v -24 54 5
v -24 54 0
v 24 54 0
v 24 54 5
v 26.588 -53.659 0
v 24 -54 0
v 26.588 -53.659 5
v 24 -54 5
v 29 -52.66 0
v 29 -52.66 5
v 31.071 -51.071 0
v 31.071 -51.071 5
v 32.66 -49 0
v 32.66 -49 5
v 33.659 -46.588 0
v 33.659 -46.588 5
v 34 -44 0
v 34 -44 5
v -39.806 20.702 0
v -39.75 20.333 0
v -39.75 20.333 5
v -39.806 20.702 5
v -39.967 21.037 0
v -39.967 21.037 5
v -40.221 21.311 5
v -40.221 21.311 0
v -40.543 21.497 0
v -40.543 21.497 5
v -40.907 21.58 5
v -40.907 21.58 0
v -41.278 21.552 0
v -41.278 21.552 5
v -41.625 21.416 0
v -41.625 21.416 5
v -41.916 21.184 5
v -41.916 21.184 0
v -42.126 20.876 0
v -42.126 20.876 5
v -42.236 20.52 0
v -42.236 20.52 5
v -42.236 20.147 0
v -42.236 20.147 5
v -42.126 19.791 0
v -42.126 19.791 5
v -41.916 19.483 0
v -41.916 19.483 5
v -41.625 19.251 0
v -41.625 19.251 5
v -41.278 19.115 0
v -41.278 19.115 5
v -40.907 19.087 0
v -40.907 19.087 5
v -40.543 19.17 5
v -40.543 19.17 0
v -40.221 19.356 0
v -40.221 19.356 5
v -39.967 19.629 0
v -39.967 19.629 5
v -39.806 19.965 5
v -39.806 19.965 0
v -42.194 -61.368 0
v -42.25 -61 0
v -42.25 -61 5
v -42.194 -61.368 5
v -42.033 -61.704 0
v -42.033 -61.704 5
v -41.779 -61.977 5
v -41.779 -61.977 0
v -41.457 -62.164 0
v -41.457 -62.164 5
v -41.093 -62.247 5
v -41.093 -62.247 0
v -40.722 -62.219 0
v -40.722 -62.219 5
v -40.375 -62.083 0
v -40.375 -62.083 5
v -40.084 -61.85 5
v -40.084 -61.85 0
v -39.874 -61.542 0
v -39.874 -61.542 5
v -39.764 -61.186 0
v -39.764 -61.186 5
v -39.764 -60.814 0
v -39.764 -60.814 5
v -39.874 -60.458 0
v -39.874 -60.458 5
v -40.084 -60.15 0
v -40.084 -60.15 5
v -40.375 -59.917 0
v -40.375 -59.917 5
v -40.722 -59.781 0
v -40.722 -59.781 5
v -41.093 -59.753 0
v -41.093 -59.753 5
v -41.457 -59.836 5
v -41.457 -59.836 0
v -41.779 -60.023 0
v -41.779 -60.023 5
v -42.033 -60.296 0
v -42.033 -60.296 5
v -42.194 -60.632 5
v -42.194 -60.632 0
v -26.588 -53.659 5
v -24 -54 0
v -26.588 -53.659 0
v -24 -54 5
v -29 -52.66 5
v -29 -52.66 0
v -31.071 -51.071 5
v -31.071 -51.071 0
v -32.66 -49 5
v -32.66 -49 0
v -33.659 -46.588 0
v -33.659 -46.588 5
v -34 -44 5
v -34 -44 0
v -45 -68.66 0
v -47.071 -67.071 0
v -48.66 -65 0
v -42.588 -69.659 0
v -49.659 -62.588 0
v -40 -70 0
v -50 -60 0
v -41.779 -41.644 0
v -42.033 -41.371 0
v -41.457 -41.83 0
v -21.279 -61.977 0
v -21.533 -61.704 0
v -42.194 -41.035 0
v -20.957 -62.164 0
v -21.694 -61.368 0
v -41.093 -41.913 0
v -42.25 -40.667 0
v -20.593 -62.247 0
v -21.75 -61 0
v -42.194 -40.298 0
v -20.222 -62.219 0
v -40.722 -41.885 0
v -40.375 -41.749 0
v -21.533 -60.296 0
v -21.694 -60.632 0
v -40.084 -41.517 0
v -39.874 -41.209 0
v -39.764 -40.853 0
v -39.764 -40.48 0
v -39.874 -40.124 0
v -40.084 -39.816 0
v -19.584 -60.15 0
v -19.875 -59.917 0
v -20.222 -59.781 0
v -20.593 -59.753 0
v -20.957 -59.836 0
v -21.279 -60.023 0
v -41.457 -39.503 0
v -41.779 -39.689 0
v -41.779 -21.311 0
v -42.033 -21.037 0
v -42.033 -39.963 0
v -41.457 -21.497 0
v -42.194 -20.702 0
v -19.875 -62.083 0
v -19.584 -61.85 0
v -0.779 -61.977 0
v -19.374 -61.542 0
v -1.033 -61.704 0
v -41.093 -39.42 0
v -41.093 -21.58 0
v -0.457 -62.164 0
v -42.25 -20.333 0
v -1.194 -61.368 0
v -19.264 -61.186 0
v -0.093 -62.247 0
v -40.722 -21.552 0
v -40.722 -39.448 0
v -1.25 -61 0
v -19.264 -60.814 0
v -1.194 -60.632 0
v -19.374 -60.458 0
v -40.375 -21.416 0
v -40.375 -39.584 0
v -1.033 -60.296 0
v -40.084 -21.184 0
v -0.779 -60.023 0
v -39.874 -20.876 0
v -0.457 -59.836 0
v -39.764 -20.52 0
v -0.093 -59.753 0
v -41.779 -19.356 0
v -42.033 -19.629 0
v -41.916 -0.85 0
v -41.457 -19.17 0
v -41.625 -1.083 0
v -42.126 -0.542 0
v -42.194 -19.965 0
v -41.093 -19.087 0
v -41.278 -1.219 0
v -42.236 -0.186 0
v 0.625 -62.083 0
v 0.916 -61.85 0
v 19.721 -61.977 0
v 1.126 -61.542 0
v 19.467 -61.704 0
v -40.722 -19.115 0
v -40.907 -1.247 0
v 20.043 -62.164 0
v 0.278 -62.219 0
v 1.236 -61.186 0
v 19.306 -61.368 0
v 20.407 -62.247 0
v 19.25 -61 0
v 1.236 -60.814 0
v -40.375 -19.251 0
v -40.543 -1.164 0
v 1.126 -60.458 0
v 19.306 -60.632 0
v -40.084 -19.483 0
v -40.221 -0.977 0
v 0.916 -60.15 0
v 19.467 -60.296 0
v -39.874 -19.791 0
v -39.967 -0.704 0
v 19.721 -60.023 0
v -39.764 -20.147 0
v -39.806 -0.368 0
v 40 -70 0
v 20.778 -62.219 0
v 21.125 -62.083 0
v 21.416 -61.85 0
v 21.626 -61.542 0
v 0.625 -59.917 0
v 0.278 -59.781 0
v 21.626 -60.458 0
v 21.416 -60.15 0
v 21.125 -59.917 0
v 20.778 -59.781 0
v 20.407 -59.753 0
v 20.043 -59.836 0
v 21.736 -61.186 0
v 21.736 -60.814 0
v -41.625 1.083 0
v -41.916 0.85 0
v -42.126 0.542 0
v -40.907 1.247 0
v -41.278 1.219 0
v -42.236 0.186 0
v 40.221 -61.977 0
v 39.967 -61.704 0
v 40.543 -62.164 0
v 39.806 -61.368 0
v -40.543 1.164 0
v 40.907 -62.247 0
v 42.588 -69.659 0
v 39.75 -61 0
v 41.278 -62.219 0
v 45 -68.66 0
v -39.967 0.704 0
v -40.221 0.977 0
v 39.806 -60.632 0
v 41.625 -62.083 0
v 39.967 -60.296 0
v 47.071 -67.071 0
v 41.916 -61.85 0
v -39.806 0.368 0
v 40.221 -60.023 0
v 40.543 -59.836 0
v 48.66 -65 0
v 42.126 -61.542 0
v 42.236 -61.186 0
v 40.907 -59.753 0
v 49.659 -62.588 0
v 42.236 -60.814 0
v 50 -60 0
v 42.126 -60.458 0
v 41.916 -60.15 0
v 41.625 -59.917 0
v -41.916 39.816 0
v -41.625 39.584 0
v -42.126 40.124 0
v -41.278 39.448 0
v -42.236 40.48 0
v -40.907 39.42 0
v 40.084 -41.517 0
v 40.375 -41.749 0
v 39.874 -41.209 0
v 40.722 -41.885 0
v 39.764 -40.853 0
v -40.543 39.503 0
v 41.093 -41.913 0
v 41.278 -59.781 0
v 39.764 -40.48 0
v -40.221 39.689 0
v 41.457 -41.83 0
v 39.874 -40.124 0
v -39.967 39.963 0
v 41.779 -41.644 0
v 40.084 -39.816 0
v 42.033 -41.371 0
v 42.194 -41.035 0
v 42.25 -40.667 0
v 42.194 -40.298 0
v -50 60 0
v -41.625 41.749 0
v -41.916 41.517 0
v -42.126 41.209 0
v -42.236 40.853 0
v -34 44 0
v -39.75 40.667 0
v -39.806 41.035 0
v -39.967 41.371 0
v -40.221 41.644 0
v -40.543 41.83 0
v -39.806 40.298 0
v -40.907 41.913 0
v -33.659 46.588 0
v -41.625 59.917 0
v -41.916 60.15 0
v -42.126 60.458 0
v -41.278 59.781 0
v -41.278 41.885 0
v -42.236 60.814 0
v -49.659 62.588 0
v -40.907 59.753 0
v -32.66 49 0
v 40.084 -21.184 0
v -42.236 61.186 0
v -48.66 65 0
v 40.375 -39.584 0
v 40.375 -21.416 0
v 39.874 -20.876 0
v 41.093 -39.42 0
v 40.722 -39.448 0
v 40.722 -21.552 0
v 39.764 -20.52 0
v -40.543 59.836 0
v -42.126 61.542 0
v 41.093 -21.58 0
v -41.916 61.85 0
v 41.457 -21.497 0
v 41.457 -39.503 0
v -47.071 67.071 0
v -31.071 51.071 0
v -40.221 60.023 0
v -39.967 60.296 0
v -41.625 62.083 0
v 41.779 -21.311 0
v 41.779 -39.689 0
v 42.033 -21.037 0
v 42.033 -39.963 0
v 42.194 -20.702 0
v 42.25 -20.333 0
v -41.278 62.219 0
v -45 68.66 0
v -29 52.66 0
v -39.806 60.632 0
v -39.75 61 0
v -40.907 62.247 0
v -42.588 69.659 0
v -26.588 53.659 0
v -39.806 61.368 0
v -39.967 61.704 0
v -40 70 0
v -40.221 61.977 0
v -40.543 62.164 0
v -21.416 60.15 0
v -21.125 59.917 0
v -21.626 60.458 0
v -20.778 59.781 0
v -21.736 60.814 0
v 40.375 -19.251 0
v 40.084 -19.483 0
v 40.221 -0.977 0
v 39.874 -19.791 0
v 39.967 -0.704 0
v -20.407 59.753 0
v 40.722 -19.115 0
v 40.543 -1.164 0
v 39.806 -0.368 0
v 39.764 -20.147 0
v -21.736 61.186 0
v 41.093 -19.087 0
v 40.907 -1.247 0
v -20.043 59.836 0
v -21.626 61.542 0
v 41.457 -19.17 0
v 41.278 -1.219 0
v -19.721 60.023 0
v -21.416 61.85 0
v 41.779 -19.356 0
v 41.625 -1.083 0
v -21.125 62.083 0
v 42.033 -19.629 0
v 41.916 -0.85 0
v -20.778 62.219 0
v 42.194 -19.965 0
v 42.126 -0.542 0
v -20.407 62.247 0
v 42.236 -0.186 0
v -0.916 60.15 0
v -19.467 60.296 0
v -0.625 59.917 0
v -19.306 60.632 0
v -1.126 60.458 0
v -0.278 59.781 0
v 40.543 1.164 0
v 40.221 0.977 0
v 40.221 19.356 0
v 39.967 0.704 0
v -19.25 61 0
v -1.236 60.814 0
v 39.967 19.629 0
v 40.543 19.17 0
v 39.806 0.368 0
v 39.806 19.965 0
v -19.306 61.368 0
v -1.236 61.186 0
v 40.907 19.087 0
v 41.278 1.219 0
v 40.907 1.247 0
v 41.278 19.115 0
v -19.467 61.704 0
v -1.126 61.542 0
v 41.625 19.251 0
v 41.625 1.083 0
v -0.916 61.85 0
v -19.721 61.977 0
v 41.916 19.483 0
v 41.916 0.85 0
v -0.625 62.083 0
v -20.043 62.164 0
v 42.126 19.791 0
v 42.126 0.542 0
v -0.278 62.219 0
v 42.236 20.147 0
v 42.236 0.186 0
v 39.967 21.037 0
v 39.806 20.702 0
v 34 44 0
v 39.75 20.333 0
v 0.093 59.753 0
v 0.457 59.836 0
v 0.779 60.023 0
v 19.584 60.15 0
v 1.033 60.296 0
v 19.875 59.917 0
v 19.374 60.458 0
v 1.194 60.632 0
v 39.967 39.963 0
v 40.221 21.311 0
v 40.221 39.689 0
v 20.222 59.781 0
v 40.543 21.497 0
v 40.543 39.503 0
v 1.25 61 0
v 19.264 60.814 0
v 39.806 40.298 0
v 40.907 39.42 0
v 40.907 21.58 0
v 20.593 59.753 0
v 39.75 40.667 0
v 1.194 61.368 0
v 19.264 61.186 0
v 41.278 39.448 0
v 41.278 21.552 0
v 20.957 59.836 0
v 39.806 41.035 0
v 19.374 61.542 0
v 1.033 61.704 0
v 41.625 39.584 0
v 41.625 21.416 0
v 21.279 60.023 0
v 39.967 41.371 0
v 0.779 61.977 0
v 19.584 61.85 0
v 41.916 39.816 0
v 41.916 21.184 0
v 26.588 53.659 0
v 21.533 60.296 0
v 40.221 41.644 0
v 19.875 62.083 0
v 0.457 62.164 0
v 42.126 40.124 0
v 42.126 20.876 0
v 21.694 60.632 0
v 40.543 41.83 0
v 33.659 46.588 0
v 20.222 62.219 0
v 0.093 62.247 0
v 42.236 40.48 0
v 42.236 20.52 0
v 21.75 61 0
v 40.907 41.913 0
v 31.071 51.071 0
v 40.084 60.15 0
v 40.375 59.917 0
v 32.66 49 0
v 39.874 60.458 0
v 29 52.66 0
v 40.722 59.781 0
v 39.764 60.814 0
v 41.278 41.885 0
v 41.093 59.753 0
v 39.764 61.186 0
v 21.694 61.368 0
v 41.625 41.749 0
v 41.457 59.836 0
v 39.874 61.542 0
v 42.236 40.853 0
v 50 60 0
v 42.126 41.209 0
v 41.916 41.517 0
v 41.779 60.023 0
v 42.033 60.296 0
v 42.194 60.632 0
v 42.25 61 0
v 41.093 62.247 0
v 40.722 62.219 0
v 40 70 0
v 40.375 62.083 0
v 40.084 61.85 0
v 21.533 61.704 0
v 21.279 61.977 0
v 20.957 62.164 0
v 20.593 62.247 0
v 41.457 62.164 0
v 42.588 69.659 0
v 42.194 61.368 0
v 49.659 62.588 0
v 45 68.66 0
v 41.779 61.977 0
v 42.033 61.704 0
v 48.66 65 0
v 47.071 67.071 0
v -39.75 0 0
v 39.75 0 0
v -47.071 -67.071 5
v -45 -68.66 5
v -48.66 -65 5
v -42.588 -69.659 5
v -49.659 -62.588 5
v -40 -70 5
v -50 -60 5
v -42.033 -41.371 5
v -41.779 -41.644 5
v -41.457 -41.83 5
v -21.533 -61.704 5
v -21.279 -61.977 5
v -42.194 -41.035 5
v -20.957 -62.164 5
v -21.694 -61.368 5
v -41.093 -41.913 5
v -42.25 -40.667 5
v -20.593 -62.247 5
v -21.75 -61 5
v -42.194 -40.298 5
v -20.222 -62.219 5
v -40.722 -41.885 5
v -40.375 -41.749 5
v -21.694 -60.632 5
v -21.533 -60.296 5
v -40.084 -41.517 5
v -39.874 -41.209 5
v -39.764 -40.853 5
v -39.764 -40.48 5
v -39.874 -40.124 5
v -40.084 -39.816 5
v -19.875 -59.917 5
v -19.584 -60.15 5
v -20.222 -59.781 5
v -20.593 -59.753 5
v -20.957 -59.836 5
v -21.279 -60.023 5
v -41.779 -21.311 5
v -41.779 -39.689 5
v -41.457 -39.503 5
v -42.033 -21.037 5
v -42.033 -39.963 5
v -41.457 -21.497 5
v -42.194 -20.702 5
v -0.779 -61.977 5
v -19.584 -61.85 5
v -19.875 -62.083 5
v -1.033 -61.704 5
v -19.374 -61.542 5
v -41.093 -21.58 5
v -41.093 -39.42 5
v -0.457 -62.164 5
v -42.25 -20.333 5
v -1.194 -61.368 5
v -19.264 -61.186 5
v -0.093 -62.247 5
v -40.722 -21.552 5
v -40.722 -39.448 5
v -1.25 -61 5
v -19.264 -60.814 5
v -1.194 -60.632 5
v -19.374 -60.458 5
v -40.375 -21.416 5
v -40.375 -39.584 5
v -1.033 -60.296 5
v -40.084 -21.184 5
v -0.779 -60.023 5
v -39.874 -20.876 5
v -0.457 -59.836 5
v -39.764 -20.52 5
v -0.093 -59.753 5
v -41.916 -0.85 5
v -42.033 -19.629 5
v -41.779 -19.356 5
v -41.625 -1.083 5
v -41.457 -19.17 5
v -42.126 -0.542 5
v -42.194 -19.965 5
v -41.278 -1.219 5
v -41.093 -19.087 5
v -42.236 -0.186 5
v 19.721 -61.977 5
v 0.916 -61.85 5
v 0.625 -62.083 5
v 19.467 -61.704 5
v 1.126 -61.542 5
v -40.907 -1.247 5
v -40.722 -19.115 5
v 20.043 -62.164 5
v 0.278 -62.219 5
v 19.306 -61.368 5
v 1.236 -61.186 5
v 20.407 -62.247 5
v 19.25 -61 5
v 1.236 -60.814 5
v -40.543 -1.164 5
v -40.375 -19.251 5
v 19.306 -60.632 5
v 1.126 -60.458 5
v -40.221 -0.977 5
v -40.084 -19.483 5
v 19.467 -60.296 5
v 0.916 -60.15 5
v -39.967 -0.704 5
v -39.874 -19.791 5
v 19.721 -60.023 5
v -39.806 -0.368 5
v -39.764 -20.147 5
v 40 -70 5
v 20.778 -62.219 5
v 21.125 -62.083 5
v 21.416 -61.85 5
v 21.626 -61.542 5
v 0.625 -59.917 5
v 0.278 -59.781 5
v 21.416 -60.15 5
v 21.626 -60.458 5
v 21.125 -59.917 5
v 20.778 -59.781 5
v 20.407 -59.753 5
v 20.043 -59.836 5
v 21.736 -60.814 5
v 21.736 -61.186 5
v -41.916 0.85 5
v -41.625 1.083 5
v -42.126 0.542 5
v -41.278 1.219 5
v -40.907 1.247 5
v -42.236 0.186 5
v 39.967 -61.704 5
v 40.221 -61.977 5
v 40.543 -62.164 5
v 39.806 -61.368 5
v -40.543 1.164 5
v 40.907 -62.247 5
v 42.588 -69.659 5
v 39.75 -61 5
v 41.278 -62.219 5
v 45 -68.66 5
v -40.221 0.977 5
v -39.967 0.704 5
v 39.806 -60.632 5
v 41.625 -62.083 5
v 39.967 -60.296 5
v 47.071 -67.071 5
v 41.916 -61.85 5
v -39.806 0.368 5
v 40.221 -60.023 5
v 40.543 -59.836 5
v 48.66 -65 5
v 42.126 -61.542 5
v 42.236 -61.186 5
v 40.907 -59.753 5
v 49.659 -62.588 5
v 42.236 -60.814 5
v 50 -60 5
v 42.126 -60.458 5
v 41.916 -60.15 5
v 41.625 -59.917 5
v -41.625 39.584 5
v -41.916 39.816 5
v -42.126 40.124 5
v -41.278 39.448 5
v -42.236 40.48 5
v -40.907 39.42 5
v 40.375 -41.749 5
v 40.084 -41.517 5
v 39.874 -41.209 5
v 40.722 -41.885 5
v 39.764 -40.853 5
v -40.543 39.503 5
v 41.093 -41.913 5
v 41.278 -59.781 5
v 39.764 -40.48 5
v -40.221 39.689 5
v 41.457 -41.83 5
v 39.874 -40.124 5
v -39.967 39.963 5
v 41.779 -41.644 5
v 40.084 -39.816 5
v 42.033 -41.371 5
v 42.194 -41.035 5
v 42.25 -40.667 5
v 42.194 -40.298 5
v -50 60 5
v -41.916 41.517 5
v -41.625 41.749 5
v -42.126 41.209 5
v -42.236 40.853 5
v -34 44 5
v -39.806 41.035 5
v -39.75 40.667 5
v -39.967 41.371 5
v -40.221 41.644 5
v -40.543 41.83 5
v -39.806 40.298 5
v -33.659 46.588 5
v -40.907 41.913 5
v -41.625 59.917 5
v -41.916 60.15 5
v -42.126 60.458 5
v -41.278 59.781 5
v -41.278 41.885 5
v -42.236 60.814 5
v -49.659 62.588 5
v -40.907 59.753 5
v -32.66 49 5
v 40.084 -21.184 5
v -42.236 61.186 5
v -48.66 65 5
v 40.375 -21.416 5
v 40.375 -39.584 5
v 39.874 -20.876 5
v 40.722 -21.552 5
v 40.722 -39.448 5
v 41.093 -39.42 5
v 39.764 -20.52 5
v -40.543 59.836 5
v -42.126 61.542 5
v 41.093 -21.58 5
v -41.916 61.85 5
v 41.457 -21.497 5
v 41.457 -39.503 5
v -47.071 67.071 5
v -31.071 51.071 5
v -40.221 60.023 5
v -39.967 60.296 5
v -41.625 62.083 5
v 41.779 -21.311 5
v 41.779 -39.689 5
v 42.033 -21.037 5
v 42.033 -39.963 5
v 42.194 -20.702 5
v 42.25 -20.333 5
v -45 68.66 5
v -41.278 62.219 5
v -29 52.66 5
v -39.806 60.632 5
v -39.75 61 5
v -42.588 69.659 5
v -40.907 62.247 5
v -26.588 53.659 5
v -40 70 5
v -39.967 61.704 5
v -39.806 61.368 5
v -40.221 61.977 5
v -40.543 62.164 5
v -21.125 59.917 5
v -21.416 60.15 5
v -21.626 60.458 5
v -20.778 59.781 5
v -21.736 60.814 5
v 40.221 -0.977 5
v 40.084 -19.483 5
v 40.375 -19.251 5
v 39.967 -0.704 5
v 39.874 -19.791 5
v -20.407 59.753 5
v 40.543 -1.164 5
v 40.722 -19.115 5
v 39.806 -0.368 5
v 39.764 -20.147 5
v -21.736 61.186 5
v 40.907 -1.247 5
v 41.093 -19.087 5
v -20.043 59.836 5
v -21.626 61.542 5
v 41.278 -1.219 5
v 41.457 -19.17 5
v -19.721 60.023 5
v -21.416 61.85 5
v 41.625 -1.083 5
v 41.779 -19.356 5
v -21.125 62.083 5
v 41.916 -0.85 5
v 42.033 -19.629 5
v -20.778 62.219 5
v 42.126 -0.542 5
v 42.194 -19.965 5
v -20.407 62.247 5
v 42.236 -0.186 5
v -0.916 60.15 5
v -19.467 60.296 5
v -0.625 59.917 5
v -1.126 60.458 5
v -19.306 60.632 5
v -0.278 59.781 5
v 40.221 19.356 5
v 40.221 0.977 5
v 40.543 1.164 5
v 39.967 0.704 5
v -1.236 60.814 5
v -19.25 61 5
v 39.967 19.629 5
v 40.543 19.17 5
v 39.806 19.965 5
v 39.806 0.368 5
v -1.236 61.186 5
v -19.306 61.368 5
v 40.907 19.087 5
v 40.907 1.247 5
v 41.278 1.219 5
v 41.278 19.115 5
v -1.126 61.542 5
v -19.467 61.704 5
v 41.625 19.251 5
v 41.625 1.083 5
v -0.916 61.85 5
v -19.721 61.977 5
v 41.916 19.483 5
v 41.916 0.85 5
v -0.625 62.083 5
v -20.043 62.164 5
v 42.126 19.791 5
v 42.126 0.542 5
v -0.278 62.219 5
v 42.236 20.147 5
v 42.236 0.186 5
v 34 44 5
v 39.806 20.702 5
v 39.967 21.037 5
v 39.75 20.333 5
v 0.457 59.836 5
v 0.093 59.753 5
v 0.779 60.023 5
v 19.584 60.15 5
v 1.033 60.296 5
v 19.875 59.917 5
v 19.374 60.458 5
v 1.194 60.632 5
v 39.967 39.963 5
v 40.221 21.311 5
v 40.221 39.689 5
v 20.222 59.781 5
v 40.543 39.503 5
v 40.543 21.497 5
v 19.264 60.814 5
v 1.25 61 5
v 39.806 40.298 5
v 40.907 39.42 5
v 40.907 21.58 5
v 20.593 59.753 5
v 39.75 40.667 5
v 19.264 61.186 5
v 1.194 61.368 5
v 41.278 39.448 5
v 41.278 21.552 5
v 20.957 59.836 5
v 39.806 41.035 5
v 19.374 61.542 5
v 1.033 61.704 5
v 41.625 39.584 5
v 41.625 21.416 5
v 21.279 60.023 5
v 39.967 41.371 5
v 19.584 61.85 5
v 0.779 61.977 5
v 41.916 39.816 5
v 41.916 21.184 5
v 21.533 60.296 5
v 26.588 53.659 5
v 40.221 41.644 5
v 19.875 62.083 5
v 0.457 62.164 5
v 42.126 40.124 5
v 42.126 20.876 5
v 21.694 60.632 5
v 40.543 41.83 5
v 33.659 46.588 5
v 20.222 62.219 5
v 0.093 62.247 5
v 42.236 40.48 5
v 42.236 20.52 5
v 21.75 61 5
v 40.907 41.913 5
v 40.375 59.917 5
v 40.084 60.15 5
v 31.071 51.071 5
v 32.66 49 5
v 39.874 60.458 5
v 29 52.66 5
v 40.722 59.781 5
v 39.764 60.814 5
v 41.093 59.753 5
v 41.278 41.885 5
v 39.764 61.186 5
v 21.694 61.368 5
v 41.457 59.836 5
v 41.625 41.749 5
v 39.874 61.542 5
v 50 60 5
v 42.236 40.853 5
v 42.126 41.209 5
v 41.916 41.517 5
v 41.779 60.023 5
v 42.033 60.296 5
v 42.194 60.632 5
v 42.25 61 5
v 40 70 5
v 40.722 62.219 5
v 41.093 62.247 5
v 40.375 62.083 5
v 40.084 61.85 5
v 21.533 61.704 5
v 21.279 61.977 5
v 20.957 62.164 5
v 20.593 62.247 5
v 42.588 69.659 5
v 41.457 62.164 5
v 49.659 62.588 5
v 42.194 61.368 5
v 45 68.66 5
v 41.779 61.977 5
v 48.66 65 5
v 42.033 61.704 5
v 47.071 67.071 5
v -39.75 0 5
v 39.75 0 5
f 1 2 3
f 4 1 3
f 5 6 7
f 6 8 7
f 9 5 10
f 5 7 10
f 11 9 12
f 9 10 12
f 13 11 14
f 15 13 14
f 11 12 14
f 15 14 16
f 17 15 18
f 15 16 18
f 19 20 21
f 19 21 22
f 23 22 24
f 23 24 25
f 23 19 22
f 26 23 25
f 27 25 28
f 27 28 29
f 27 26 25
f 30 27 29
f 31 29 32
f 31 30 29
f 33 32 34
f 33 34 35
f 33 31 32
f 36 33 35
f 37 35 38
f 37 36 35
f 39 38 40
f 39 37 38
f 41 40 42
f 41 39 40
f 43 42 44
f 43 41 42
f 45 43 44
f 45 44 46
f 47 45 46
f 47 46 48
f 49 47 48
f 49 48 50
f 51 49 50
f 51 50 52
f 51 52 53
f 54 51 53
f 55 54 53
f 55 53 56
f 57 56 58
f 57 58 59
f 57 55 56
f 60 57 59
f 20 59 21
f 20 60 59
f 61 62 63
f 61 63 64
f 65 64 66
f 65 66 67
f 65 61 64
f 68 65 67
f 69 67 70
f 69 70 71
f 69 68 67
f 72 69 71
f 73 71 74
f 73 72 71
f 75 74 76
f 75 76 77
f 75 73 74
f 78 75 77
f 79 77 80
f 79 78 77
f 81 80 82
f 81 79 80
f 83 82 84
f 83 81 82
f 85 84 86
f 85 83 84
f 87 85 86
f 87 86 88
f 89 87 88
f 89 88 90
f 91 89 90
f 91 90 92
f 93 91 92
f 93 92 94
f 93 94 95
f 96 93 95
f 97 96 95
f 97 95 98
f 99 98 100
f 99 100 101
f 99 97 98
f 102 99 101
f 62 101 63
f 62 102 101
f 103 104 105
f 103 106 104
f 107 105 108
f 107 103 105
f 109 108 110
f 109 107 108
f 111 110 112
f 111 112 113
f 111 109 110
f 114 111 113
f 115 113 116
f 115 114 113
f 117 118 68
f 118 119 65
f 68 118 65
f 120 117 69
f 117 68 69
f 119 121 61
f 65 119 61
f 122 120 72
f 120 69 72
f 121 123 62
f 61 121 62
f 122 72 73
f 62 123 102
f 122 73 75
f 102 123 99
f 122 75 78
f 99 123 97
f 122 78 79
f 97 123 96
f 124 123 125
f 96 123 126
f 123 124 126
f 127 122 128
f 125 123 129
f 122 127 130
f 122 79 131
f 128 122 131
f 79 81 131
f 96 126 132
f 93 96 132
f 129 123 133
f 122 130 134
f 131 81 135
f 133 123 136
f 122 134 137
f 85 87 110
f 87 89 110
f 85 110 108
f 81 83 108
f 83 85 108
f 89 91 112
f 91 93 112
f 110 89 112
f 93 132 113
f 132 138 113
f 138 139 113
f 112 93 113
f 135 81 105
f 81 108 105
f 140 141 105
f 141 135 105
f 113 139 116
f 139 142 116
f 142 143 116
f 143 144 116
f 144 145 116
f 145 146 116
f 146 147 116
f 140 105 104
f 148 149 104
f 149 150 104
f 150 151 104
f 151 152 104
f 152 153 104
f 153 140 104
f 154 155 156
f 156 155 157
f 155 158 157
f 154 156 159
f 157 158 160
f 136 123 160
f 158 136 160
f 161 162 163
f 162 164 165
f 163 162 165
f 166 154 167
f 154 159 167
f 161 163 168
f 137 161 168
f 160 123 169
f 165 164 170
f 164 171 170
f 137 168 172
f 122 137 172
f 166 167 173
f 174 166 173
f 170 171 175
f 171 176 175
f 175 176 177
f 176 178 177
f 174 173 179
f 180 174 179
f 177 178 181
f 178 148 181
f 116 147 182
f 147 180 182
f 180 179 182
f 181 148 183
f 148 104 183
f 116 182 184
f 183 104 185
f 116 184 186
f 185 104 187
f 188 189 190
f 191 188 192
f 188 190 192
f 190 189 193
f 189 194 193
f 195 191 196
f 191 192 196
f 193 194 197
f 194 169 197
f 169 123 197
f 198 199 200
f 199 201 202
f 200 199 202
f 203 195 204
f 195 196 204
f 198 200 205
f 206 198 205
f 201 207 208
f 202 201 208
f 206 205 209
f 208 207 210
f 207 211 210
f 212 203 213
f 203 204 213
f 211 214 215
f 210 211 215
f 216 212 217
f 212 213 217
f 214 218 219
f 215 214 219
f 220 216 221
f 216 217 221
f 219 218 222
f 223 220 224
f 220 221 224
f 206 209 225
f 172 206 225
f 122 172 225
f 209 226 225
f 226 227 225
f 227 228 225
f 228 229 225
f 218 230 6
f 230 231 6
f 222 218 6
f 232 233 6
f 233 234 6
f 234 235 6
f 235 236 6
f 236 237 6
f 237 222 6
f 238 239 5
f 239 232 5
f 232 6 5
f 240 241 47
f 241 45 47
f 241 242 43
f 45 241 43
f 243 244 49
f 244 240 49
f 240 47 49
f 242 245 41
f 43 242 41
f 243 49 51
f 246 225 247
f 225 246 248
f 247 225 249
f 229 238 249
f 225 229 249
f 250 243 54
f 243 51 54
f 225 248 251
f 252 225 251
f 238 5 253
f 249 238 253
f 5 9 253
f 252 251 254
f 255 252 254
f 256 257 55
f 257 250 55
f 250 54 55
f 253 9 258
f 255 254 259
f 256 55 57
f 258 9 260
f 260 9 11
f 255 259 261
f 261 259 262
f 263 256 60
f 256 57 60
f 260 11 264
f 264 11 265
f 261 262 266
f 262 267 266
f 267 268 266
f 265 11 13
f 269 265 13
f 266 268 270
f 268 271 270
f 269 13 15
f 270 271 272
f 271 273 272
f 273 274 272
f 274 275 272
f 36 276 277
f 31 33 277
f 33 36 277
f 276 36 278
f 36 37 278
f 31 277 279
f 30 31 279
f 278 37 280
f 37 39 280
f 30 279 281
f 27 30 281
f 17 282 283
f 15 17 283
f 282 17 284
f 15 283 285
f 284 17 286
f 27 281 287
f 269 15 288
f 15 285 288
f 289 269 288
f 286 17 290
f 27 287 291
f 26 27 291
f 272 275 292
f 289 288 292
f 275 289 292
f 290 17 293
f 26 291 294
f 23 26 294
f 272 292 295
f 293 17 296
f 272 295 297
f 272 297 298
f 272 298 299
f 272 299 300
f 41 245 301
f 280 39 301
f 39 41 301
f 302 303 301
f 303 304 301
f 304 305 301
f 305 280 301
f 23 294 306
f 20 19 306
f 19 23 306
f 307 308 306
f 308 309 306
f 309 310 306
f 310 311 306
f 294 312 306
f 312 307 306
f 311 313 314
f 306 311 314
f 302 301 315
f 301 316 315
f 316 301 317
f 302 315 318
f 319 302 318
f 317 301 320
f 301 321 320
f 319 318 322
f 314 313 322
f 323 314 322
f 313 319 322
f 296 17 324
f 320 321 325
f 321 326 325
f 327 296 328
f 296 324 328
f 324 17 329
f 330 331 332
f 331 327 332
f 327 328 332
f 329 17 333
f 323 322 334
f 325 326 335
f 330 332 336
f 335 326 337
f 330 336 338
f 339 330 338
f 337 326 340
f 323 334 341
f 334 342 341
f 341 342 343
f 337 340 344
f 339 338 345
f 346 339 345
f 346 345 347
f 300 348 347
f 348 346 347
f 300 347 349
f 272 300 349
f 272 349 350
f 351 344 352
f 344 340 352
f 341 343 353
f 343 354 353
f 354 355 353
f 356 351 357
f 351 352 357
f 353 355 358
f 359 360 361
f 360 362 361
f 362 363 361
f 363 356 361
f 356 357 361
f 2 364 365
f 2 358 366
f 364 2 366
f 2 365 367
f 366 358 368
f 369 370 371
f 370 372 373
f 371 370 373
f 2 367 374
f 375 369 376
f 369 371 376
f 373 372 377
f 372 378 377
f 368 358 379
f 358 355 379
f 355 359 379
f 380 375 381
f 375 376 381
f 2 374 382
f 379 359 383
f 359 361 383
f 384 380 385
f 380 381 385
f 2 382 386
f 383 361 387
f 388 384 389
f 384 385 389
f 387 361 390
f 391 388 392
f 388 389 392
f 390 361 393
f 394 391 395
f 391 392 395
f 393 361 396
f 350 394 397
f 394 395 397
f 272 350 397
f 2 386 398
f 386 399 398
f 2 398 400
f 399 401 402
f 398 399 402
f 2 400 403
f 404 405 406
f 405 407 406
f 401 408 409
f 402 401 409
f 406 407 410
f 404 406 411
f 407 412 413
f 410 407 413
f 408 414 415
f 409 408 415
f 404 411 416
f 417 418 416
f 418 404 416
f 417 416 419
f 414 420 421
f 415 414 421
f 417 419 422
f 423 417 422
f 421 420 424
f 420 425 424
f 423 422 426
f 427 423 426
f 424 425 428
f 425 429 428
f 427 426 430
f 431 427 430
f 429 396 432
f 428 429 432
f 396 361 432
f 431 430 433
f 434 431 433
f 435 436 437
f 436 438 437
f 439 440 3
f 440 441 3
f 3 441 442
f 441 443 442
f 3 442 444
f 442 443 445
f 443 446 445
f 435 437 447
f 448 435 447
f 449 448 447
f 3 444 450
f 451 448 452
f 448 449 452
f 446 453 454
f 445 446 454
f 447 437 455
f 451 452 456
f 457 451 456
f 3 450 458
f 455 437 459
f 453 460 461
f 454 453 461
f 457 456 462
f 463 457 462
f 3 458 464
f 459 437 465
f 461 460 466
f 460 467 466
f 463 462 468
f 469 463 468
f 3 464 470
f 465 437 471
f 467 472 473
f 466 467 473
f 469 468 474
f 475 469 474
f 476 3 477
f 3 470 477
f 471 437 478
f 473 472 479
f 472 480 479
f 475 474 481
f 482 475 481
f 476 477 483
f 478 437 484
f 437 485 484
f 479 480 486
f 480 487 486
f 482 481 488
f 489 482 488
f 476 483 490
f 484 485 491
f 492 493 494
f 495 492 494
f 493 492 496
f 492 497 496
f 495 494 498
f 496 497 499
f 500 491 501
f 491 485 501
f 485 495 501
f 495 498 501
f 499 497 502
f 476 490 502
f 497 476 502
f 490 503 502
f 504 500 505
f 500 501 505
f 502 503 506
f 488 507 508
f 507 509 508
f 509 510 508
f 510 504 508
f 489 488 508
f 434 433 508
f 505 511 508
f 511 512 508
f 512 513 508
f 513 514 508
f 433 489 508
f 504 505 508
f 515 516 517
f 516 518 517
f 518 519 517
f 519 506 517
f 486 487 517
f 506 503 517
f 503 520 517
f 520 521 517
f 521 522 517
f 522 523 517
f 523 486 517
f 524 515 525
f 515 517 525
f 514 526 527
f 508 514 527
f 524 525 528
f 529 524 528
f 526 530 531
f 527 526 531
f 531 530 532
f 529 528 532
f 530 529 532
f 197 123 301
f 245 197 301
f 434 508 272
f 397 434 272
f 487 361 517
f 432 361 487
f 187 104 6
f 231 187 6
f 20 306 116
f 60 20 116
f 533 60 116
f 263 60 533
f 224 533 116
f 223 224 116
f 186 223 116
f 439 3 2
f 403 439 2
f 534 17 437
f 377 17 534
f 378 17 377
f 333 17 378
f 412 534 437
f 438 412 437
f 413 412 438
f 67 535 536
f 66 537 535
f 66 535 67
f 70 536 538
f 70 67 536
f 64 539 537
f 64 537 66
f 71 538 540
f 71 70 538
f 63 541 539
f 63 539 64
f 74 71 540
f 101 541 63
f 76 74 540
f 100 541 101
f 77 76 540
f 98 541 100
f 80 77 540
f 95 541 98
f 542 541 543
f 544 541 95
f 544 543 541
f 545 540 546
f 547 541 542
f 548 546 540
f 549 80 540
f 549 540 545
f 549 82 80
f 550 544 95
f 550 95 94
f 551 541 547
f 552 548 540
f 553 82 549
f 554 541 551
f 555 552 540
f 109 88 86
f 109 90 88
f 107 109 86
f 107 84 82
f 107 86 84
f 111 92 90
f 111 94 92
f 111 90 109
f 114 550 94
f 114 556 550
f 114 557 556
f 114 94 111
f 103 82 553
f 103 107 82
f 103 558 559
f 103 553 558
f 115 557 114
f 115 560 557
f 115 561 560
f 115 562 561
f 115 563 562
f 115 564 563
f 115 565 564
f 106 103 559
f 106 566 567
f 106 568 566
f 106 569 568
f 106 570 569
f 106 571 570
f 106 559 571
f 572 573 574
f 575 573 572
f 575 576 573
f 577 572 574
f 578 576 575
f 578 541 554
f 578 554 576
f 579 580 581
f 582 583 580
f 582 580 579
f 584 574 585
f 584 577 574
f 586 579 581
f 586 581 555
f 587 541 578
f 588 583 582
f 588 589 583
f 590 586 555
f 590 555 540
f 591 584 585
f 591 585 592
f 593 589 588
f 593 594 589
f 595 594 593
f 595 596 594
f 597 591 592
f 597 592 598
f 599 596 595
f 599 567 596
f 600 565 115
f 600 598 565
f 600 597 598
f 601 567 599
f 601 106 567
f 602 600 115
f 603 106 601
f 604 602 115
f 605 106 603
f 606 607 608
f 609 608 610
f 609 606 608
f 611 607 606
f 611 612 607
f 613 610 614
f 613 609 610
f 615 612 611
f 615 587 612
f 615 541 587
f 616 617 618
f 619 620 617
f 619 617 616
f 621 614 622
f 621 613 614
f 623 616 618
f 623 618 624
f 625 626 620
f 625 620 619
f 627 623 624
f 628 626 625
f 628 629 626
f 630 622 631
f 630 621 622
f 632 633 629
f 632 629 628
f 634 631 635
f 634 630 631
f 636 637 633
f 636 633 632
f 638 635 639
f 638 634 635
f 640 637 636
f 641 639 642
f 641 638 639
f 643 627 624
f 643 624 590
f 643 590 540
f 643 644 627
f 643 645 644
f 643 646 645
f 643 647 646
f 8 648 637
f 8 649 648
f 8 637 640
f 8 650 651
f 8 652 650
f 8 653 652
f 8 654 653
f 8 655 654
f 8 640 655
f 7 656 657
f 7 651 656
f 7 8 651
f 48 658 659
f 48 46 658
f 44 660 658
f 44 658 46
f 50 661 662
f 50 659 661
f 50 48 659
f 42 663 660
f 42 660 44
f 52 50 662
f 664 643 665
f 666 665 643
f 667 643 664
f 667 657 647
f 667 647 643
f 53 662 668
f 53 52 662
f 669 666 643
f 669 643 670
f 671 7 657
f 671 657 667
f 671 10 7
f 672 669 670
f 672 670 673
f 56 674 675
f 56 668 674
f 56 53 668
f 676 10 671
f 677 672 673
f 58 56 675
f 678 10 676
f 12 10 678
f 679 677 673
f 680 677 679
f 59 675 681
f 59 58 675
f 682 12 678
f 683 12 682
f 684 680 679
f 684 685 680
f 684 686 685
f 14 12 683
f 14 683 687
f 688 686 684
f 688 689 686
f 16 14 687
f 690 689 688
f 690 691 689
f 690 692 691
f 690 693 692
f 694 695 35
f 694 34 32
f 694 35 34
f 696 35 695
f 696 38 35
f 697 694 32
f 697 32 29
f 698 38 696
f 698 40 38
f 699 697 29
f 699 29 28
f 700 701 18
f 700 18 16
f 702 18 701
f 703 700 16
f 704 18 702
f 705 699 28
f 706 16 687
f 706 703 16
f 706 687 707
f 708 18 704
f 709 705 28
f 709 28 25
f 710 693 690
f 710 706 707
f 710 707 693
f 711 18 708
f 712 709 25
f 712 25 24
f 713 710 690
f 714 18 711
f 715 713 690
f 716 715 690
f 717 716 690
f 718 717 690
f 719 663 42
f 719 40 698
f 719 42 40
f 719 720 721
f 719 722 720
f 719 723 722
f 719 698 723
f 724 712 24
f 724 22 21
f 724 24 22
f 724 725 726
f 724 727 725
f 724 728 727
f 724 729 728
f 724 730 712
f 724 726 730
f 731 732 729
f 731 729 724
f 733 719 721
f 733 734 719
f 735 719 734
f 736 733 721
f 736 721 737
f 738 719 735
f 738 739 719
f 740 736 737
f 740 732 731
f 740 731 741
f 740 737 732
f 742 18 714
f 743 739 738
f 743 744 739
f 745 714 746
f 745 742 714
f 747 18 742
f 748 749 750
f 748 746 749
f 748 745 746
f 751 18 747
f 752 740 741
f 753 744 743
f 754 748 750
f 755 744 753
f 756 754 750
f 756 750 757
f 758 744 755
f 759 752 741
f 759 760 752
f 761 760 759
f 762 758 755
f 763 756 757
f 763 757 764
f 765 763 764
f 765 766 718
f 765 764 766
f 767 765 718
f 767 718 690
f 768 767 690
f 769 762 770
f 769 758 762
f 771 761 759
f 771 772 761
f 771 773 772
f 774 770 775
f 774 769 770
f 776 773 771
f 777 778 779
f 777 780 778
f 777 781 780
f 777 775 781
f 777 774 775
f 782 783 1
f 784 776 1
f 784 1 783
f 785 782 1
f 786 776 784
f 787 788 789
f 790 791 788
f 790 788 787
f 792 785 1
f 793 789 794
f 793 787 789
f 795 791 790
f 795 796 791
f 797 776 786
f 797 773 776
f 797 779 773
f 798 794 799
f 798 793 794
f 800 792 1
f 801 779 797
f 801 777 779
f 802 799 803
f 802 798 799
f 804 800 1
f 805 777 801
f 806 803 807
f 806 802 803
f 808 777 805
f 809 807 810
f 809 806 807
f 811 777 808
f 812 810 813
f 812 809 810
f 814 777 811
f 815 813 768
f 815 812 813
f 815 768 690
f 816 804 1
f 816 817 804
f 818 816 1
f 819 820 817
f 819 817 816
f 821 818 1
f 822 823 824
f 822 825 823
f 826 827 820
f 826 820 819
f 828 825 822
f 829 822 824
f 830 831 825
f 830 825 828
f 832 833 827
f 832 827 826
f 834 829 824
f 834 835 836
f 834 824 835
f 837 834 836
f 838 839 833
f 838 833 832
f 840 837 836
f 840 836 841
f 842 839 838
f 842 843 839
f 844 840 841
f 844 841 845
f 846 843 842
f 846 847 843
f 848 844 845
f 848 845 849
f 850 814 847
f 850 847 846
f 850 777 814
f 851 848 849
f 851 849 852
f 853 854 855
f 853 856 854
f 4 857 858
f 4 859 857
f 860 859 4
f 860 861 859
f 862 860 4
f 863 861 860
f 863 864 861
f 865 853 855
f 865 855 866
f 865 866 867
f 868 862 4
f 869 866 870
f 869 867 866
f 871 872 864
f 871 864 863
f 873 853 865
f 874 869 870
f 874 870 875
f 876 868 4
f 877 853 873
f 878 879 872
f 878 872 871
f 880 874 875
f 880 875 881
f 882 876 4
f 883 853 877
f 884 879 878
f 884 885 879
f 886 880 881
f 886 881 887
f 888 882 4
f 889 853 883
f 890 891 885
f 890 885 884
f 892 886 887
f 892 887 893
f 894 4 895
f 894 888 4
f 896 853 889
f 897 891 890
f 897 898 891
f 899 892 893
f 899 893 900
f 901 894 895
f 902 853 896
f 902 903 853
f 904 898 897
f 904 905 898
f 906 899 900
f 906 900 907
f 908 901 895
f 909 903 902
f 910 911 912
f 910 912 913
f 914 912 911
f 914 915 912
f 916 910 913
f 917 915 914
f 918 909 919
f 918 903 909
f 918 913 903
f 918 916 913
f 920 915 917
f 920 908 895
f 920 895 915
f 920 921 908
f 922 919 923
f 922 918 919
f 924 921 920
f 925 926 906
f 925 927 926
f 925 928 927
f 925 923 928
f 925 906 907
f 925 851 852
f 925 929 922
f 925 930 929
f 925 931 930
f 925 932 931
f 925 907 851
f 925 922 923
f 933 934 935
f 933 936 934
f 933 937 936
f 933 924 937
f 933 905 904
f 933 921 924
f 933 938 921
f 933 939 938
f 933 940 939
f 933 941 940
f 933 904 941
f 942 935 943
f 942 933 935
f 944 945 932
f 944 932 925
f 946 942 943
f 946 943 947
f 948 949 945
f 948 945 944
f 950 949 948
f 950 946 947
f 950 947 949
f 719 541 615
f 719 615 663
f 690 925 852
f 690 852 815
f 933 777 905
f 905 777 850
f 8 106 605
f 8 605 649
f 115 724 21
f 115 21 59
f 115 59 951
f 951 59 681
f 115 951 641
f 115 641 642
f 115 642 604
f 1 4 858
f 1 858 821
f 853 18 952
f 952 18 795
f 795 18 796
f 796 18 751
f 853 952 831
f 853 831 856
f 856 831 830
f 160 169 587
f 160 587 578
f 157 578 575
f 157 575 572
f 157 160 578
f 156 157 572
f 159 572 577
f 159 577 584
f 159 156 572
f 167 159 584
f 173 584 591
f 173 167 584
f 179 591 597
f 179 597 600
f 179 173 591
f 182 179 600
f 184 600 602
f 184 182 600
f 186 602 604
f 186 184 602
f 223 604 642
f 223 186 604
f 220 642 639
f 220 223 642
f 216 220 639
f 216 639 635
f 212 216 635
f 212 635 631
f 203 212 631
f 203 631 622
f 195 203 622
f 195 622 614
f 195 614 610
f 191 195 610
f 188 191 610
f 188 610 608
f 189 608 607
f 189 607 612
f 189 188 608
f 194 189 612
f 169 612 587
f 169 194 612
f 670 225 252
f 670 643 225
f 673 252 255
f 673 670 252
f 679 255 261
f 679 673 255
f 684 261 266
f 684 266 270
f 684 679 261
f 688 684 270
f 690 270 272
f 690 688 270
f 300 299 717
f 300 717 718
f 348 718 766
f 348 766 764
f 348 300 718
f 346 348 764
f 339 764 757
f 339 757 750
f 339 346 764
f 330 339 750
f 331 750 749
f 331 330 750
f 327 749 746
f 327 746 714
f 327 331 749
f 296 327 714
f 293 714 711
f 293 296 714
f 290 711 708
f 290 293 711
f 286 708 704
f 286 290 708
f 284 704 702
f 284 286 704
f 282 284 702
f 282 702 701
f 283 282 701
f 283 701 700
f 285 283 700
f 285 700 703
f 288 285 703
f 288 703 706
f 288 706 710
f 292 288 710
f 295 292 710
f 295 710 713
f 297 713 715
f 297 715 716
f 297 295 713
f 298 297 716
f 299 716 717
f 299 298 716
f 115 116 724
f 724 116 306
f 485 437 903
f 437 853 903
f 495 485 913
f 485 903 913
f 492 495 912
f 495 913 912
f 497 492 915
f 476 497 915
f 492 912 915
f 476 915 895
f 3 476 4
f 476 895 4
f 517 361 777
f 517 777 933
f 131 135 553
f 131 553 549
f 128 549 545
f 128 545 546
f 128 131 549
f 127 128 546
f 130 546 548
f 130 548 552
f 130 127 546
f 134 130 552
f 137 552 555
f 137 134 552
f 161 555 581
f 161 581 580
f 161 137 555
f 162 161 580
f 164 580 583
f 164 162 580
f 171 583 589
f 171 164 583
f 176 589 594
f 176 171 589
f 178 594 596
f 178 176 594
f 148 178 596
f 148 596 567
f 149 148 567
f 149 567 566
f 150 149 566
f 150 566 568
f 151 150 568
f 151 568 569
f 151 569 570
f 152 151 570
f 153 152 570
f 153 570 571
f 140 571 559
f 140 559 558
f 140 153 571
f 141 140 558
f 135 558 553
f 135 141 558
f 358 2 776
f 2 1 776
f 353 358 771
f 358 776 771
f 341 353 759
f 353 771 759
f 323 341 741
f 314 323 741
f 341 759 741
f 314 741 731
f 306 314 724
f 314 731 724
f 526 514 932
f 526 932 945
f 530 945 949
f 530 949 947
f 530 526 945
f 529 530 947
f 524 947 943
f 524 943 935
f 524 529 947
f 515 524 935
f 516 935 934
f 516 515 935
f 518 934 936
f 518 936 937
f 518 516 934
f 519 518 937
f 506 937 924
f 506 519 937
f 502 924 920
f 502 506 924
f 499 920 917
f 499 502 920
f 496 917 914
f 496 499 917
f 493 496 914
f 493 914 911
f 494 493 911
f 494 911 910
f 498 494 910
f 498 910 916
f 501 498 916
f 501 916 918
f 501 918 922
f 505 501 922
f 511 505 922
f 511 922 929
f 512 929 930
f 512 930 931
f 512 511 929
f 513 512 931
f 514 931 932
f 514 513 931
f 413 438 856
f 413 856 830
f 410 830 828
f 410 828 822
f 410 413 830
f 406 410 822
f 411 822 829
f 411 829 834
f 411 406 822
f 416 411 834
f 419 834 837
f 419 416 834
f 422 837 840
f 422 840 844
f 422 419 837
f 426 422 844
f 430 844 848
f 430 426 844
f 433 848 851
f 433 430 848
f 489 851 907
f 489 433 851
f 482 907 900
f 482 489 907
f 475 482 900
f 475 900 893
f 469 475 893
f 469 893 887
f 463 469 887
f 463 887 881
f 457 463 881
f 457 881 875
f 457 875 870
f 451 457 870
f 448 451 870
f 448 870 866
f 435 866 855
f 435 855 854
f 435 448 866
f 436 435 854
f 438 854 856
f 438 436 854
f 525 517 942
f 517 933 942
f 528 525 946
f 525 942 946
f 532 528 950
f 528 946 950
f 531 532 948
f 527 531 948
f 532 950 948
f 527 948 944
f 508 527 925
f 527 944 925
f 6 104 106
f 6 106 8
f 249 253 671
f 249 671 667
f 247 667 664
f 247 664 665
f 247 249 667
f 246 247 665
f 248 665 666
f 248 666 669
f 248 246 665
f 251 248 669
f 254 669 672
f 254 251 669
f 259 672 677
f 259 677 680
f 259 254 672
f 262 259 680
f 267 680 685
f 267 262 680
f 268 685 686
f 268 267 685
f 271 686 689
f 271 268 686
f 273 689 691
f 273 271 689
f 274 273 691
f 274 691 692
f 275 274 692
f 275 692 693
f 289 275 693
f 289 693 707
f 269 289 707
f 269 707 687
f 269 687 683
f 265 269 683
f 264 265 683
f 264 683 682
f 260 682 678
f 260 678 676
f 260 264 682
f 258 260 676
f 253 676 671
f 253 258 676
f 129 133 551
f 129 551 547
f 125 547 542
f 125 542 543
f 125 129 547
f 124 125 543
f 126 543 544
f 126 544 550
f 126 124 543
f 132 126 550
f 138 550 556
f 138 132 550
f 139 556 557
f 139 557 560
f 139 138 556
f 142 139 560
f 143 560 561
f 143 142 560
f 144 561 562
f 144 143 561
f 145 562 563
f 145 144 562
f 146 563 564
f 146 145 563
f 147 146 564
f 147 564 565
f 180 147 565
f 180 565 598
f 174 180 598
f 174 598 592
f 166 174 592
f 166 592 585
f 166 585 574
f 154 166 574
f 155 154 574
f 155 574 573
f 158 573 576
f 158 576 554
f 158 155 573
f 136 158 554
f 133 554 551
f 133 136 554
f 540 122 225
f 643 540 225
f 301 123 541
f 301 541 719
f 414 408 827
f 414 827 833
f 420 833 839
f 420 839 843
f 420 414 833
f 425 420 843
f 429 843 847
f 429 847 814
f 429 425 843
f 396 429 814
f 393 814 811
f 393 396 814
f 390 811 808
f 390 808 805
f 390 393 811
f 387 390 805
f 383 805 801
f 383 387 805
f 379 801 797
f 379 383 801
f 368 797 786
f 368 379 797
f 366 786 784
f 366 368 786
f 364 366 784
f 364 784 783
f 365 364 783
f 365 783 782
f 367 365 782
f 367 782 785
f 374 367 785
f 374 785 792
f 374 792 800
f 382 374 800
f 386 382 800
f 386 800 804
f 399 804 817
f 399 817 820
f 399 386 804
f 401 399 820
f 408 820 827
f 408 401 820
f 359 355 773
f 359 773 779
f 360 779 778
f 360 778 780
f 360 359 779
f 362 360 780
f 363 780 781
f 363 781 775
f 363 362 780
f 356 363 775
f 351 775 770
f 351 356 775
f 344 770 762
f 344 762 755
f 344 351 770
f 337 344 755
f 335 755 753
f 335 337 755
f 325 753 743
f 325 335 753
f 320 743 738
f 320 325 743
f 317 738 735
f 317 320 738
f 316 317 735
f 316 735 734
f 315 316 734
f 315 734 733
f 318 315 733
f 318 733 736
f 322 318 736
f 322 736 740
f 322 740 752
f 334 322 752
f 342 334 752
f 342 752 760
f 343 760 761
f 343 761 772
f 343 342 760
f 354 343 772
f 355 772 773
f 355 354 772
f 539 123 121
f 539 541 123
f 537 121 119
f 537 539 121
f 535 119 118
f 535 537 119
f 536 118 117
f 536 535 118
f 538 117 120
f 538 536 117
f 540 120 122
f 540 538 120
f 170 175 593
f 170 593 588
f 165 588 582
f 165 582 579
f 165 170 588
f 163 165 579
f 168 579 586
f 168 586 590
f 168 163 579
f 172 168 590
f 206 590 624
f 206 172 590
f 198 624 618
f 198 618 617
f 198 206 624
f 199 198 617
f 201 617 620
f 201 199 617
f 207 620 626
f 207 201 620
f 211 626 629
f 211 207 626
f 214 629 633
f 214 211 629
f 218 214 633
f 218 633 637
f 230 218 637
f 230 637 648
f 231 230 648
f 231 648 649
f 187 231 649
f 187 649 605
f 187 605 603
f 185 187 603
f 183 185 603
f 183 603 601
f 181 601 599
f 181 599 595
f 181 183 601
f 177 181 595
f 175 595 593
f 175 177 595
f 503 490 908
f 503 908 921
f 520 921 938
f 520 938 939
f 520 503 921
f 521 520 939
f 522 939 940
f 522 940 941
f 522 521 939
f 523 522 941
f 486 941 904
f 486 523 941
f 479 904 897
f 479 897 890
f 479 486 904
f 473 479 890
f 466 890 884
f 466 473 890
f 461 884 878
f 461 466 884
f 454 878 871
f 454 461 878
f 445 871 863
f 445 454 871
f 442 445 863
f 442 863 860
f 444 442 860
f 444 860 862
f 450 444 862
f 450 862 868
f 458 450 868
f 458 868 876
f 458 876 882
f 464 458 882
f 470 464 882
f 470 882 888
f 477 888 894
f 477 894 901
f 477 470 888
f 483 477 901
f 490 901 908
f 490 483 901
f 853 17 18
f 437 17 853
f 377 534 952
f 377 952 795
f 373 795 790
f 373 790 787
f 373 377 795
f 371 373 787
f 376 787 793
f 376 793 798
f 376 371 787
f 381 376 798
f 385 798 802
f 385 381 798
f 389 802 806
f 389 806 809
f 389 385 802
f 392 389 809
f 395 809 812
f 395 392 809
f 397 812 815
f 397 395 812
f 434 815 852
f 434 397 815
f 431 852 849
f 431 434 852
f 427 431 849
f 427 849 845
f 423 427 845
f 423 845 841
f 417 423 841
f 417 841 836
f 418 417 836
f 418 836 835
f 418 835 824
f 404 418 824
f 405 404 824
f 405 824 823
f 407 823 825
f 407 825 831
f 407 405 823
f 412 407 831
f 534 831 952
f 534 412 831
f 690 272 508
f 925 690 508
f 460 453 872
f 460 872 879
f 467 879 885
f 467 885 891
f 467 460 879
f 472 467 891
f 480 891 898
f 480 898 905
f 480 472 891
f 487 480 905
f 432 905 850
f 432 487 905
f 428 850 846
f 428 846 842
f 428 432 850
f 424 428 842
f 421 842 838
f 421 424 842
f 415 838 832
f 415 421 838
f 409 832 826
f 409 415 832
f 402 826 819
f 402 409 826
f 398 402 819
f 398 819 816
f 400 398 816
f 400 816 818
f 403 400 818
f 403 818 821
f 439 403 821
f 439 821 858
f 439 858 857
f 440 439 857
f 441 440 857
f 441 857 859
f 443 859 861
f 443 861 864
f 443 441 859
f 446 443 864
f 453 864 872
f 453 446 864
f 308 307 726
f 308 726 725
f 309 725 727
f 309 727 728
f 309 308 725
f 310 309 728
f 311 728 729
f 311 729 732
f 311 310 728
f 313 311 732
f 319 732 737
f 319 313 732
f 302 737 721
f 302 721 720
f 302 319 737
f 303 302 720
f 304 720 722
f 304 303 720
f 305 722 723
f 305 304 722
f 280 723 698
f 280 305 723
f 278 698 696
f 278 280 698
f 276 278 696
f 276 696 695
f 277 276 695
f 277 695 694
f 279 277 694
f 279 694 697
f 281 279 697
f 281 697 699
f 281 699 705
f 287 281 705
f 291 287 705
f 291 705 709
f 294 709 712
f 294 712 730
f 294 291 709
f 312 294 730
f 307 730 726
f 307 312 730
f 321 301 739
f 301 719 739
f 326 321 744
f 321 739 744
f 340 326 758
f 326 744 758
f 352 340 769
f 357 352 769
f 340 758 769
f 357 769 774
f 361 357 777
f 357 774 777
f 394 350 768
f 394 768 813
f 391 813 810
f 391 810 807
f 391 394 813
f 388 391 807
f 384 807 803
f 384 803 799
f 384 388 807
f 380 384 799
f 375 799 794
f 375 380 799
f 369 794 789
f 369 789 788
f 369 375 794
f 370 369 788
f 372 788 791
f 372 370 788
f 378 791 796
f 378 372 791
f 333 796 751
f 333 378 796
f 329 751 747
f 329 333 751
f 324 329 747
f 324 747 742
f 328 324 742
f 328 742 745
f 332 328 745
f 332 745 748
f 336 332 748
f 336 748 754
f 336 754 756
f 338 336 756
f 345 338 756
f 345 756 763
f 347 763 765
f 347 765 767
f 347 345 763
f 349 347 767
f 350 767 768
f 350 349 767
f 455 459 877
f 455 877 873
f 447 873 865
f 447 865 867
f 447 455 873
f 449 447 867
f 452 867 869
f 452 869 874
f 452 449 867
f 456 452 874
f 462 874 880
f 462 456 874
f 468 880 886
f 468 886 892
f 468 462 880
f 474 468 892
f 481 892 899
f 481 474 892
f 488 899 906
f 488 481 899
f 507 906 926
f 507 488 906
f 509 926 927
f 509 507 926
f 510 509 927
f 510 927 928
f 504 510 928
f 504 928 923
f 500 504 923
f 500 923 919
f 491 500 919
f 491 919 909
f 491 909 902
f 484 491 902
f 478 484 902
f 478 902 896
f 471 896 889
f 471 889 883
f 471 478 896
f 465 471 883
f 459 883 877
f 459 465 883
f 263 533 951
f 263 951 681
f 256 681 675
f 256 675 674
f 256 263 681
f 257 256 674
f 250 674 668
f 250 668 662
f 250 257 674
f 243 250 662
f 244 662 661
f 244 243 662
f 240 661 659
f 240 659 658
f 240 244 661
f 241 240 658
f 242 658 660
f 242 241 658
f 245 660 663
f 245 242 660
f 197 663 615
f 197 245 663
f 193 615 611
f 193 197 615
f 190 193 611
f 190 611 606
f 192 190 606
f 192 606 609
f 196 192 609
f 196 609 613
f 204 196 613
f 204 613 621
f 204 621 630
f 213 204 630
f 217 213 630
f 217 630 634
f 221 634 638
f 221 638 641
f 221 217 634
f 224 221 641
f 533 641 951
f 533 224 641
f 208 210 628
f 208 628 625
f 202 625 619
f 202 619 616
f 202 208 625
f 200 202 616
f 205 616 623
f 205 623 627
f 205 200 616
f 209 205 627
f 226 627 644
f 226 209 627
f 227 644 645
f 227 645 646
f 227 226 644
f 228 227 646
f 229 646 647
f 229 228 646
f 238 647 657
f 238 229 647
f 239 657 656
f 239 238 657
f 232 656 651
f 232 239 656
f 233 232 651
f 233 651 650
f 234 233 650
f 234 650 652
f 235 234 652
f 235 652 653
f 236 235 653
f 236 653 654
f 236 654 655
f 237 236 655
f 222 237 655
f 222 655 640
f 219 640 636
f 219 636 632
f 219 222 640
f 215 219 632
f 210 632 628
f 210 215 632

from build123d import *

# Parameters (mm, degrees)
SKETCH1_W           = 100
SKETCH1_H           = 140
SKETCH1_R           = 1.25
SKETCH1_W_2         = 68
SKETCH1_H_2         = 108
BOSS_EXTRUDE1_DEPTH = 5
FILLET1_R           = 10


with BuildPart() as part:
    # Sketch1 → Boss-Extrude1 (new body)
    with BuildSketch(Plane.XY):
        Rectangle(SKETCH1_W, SKETCH1_H)
        with Locations((0, 61)):
            Circle(SKETCH1_R, mode=Mode.SUBTRACT)
        with Locations((-41, 61)):
            Circle(SKETCH1_R, mode=Mode.SUBTRACT)
        with Locations((-20.5, 61)):
            Circle(SKETCH1_R, mode=Mode.SUBTRACT)
        with Locations((20.5, 61)):
            Circle(SKETCH1_R, mode=Mode.SUBTRACT)
        with Locations((41, 61)):
            Circle(SKETCH1_R, mode=Mode.SUBTRACT)
        with Locations((-41, 0)):
            Circle(SKETCH1_R, mode=Mode.SUBTRACT)
        with Locations((-41, 40.666666667)):
            Circle(SKETCH1_R, mode=Mode.SUBTRACT)
        with Locations((-41, 20.333333333)):
            Circle(SKETCH1_R, mode=Mode.SUBTRACT)
        with Locations(Location((41, 40.666666667, 0), (0, 0, 180))):
            Circle(SKETCH1_R, mode=Mode.SUBTRACT)
        with Locations(Location((41, 20.333333333, 0), (0, 0, 180))):
            Circle(SKETCH1_R, mode=Mode.SUBTRACT)
        with Locations(Location((41, 0, 0), (0, 0, 180))):
            Circle(SKETCH1_R, mode=Mode.SUBTRACT)
        with Locations(Location((-20.5, -61, 0), (0, 0, 180))):
            Circle(SKETCH1_R, mode=Mode.SUBTRACT)
        with Locations(Location((0, -61, 0), (0, 0, 180))):
            Circle(SKETCH1_R, mode=Mode.SUBTRACT)
        with Locations(Location((20.5, -61, 0), (0, 0, 180))):
            Circle(SKETCH1_R, mode=Mode.SUBTRACT)
        with Locations(Location((41, -61, 0), (0, 0, 180))):
            Circle(SKETCH1_R, mode=Mode.SUBTRACT)
        with Locations((41, -40.666666667)):
            Circle(SKETCH1_R, mode=Mode.SUBTRACT)
        with Locations((41, -20.333333333)):
            Circle(SKETCH1_R, mode=Mode.SUBTRACT)
        with Locations(Location((-41, -20.333333333, 0), (0, 0, 180))):
            Circle(SKETCH1_R, mode=Mode.SUBTRACT)
        with Locations(Location((-41, -40.666666667, 0), (0, 0, 180))):
            Circle(SKETCH1_R, mode=Mode.SUBTRACT)
        with Locations(Location((-41, -61, 0), (0, 0, 180))):
            Circle(SKETCH1_R, mode=Mode.SUBTRACT)
        Rectangle(SKETCH1_W_2, SKETCH1_H_2, mode=Mode.SUBTRACT)
    extrude(amount=BOSS_EXTRUDE1_DEPTH)

    # Fillet1
    fillet1_edges = [part.edges().sort_by_distance(p)[0] for p in [
        (50, -70, 2.5),
        (-50, -70, 2.5),
        (-50, 70, 2.5),
        (50, 70, 2.5),
        (34, -54, 2.5),
        (34, 54, 2.5),
        (-34, 54, 2.5),
        (-34, -54, 2.5),
    ]]
    fillet(fillet1_edges, radius=FILLET1_R)


solid = part.part
